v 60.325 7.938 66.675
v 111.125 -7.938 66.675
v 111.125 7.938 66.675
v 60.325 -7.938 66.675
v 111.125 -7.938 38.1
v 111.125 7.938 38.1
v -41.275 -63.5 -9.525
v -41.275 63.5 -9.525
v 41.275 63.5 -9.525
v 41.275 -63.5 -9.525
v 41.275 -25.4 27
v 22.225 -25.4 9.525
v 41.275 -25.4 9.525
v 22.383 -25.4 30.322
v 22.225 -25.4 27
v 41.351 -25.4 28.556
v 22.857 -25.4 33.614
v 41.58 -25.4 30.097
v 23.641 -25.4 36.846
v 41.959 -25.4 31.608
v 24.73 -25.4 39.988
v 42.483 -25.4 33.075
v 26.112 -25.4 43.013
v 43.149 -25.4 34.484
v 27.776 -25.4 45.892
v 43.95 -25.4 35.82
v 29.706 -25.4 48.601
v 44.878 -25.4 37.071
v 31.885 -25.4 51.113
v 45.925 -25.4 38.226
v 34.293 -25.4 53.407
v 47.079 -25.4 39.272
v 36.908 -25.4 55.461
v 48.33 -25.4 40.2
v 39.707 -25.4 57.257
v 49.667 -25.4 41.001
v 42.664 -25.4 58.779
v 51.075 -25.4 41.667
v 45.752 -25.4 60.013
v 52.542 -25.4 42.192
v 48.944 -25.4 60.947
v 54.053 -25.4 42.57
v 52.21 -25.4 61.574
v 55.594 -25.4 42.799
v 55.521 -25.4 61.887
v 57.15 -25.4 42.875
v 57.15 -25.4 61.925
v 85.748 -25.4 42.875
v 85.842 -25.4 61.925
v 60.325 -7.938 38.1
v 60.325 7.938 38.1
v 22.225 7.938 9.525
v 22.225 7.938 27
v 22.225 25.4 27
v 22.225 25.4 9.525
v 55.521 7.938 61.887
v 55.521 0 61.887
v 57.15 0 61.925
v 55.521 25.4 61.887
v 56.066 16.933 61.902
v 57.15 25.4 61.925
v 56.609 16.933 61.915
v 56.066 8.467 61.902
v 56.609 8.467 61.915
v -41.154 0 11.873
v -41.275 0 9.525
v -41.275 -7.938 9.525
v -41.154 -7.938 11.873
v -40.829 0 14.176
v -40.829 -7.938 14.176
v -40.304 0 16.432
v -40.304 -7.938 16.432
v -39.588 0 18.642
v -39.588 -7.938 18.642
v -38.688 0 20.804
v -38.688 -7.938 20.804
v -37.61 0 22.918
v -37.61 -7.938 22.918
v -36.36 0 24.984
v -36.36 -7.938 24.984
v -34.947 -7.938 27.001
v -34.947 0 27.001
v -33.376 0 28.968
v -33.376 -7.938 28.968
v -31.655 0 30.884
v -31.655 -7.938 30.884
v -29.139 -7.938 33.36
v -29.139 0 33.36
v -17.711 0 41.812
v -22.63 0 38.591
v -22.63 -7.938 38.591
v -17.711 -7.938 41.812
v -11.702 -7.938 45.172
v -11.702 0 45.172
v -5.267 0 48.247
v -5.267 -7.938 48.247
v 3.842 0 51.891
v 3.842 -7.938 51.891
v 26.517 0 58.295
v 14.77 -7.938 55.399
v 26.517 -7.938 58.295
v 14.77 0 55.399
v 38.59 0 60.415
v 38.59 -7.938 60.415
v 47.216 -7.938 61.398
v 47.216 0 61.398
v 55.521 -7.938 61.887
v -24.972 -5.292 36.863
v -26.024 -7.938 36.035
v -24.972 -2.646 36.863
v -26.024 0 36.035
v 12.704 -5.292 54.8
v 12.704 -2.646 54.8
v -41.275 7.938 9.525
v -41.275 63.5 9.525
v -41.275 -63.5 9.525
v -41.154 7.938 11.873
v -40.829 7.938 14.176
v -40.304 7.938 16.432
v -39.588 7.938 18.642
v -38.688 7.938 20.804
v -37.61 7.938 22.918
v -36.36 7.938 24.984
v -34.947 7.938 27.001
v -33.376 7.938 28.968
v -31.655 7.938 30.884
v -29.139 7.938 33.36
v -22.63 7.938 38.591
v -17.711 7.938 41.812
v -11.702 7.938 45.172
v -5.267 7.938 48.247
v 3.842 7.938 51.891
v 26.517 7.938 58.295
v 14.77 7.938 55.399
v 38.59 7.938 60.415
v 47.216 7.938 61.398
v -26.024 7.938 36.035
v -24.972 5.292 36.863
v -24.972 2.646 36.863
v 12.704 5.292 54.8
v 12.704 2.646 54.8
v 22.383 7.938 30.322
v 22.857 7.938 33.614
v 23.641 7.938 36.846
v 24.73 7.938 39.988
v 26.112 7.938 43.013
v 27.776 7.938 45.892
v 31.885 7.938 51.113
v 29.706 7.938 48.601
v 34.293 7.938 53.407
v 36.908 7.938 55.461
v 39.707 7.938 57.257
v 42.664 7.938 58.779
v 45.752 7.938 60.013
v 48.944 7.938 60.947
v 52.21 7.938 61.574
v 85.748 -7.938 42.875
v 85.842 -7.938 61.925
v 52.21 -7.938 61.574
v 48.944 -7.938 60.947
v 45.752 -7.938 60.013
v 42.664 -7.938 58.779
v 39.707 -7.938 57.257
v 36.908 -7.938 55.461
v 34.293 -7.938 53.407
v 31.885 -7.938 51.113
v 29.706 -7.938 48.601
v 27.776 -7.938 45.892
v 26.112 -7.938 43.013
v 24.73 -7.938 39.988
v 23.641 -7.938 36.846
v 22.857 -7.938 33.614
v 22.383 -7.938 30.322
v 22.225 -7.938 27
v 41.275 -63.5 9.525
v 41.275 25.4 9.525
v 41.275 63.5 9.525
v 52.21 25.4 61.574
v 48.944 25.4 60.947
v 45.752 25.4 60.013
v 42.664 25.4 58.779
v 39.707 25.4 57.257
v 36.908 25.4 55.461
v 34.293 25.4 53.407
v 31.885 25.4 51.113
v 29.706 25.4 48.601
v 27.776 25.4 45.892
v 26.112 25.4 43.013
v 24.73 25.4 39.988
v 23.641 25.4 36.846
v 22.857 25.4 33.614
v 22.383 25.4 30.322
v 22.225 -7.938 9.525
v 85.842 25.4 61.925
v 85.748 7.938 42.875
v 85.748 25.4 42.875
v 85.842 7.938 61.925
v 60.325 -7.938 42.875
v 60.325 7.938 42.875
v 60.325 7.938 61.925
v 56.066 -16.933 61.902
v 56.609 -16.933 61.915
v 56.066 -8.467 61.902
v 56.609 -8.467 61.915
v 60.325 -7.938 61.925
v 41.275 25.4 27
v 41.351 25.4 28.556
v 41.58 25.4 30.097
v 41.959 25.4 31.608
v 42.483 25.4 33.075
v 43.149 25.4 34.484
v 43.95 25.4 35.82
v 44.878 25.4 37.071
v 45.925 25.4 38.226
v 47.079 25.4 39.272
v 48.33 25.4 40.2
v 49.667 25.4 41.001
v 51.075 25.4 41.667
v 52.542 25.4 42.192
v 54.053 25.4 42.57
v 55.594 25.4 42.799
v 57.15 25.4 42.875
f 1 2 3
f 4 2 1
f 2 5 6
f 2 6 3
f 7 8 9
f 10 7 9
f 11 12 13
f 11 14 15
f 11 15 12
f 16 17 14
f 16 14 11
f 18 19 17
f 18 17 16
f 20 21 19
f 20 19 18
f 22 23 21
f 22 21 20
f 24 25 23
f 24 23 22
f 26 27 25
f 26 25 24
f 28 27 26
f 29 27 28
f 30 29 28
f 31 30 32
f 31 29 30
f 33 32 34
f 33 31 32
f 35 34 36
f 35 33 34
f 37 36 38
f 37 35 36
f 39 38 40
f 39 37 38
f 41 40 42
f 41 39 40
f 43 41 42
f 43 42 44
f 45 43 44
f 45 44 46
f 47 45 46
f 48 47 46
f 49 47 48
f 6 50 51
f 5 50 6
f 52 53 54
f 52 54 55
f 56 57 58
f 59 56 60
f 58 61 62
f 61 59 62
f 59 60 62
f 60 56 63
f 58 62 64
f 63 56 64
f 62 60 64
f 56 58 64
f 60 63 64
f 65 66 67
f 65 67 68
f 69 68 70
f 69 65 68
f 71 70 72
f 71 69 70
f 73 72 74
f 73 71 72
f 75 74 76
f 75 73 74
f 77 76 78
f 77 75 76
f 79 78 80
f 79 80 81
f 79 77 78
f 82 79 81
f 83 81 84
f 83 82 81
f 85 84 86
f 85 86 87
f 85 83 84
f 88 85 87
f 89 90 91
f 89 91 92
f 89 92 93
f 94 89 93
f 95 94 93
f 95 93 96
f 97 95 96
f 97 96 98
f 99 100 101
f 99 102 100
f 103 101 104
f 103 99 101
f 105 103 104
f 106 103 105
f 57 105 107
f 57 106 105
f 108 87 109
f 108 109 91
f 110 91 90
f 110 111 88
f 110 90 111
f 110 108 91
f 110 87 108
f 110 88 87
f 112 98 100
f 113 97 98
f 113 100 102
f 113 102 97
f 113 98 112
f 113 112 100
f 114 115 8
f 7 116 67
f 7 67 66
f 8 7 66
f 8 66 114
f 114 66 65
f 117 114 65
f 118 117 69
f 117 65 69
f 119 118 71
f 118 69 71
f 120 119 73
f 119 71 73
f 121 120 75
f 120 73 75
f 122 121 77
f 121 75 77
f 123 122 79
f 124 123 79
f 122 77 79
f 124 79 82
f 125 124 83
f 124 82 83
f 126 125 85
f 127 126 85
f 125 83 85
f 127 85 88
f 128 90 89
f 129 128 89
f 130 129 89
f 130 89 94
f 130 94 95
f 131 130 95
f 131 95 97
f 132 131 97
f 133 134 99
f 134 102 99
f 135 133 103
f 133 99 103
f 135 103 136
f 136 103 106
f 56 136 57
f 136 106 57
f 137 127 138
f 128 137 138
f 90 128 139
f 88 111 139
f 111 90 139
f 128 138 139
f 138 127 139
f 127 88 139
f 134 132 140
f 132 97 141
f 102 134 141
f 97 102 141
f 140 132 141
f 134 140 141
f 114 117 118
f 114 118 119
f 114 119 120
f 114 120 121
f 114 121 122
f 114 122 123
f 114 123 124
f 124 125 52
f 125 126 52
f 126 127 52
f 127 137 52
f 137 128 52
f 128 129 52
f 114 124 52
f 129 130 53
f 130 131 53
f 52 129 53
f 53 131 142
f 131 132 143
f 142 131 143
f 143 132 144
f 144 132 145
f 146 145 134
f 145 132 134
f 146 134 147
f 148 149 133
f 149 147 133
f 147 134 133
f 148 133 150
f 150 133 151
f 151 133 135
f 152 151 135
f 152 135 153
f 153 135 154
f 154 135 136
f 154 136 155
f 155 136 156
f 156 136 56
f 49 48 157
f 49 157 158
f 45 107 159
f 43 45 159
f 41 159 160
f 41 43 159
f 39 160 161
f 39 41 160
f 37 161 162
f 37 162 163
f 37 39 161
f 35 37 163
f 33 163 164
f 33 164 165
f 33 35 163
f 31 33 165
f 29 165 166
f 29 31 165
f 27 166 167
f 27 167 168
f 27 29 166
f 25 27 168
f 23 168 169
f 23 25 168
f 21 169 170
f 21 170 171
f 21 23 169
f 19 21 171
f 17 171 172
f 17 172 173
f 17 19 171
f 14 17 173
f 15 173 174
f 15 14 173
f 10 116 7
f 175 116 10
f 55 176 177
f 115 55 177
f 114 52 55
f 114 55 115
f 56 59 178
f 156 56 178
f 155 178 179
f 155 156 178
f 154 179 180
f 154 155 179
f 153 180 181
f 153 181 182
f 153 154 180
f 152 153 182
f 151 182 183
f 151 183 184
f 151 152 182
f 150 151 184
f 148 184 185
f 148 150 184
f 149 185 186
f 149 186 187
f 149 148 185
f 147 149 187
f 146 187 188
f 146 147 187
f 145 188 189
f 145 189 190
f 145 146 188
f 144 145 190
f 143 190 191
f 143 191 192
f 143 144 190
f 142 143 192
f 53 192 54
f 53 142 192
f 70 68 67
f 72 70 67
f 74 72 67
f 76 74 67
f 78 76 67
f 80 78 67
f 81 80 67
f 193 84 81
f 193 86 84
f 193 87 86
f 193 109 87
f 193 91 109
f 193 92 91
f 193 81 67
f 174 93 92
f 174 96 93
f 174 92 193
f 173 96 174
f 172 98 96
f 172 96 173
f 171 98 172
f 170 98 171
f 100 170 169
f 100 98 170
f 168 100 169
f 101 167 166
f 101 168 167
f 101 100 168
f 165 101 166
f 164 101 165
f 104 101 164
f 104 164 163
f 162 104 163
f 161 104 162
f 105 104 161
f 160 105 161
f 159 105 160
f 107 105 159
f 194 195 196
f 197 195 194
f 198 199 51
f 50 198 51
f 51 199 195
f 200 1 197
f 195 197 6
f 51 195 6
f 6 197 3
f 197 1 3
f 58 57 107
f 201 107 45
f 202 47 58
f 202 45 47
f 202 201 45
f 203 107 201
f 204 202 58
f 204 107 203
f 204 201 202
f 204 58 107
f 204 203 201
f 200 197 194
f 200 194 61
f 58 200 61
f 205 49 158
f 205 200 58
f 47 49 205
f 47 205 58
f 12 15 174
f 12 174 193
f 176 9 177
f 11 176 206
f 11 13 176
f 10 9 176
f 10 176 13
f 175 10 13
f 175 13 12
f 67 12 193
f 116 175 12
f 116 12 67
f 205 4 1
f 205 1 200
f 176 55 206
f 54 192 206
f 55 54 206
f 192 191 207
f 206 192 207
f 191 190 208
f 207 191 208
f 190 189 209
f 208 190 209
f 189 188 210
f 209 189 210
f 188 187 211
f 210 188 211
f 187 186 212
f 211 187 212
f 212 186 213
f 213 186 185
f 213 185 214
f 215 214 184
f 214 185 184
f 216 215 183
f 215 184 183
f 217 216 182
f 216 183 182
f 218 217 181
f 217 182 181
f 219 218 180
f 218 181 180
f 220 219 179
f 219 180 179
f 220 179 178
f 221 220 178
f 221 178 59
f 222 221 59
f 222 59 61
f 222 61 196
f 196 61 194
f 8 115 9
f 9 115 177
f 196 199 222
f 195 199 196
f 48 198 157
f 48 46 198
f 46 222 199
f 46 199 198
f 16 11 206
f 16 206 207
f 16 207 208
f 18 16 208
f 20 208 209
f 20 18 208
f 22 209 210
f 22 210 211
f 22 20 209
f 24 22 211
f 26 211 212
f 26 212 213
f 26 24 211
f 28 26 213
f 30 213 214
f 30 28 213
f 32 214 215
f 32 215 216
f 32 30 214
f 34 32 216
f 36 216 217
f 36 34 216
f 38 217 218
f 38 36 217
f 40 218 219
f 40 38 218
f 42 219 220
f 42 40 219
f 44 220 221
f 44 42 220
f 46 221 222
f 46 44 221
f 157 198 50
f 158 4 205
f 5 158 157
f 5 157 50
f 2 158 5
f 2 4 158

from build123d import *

# Parameters (mm, degrees)
F1_DEPTH = 63.5
F2_DEPTH = 25.4
F3_DEPTH = 7.9375


with BuildPart() as f1:
    # F0 (on Front) → F1 (new body, symmetric)
    with BuildSketch(Plane.XZ):
        Polygon((41.275, -9.525), (41.275, 9.525), (22.225, 9.525), (-41.275, 9.525), (-41.275, -9.525), align=None)
    extrude(amount=F1_DEPTH, both=True)

    # F0 (on Front) → F2 (join, symmetric)
    with BuildSketch(Plane.XZ):
        with BuildLine():
            Line((22.225, 9.525), (41.275, 9.525))
            Line((41.275, 9.525), (41.275, 27.0002))
            ThreePointArc((41.275, 27.0002), (45.9246798487, 38.2255201513), (57.15, 42.8752))
            Line((57.15, 42.8752), (60.325, 42.8752))
            Line((60.325, 42.8752), (60.325, 61.9252))
            Line((60.325, 61.9252), (57.15, 61.9252))
            add(Edge.make_bspline(
                [(55.5210256517, 61.8871899471), (56.0671839511, 61.9033086419), (56.6102374814, 61.9159842015), (57.15, 61.9252)],
                knots=[110.0017210547, 110.0017210547, 110.0017210547, 110.0017210547, 111.5045361635, 111.5045361635, 111.5045361635, 111.5045361635], degree=3))
            ThreePointArc((55.5210256517, 61.8871899471), (31.8849297041, 51.1130979582), (22.225, 27.0002))
            Line((22.225, 27.0002), (22.225, 9.525))
        make_face()
        Polygon((60.325, 61.9252), (60.325, 42.8752), (85.7483517106, 42.8752), (85.8415101305, 61.9252), align=None)
    extrude(amount=F2_DEPTH, both=True)

    # F0 (on Front) → F3 (join, symmetric)
    with BuildSketch(Plane.XZ):
        Polygon((41.275, -9.525), (41.275, 9.525), (22.225, 9.525), (-41.275, 9.525), (-41.275, -9.525), align=None)
        with BuildLine():
            Line((22.225, 9.525), (41.275, 9.525))
            Line((41.275, 9.525), (41.275, 27.0002))
            ThreePointArc((41.275, 27.0002), (45.9246798487, 38.2255201513), (57.15, 42.8752))
            Line((57.15, 42.8752), (60.325, 42.8752))
            Line((60.325, 42.8752), (60.325, 61.9252))
            Line((60.325, 61.9252), (57.15, 61.9252))
            add(Edge.make_bspline(
                [(55.5210256517, 61.8871899471), (56.0671839511, 61.9033086419), (56.6102374814, 61.9159842015), (57.15, 61.9252)],
                knots=[110.0017210547, 110.0017210547, 110.0017210547, 110.0017210547, 111.5045361635, 111.5045361635, 111.5045361635, 111.5045361635], degree=3))
            ThreePointArc((55.5210256517, 61.8871899471), (31.8849297041, 51.1130979582), (22.225, 27.0002))
            Line((22.225, 27.0002), (22.225, 9.525))
        make_face()
        with BuildLine():
            Line((-41.275, 9.525), (22.225, 9.525))
            Line((22.225, 9.525), (22.225, 27.0002))
            ThreePointArc((22.225, 27.0002), (31.8849297041, 51.1130979582), (55.5210256517, 61.8871899471))
            add(Edge.make_bspline(
                [(-41.275, 9.525), (-41.0681757543, 41.079819722), (15.5438171721, 60.7073480966), (55.5210256517, 61.8871899471)],
                knots=[0, 0, 0, 0, 110.0017210547, 110.0017210547, 110.0017210547, 110.0017210547], degree=3))
        make_face()
        Polygon((85.7483517106, 42.8752), (60.325, 42.8752), (60.325, 38.1), (85.725, 38.1), align=None)
        Polygon((60.325, 61.9252), (60.325, 42.8752), (85.7483517106, 42.8752), (85.8415101305, 61.9252), align=None)
        Polygon((60.325, 66.675), (60.325, 61.9252), (85.8415101305, 61.9252), (85.8647376299, 66.675), align=None)
        Polygon((85.8415101305, 61.9252), (85.7483517106, 42.8752), (85.725, 38.1), (111.125, 38.1), (111.125, 66.675), (85.8647376299, 66.675), align=None)
    extrude(amount=F3_DEPTH, both=True)


solid = f1.part
